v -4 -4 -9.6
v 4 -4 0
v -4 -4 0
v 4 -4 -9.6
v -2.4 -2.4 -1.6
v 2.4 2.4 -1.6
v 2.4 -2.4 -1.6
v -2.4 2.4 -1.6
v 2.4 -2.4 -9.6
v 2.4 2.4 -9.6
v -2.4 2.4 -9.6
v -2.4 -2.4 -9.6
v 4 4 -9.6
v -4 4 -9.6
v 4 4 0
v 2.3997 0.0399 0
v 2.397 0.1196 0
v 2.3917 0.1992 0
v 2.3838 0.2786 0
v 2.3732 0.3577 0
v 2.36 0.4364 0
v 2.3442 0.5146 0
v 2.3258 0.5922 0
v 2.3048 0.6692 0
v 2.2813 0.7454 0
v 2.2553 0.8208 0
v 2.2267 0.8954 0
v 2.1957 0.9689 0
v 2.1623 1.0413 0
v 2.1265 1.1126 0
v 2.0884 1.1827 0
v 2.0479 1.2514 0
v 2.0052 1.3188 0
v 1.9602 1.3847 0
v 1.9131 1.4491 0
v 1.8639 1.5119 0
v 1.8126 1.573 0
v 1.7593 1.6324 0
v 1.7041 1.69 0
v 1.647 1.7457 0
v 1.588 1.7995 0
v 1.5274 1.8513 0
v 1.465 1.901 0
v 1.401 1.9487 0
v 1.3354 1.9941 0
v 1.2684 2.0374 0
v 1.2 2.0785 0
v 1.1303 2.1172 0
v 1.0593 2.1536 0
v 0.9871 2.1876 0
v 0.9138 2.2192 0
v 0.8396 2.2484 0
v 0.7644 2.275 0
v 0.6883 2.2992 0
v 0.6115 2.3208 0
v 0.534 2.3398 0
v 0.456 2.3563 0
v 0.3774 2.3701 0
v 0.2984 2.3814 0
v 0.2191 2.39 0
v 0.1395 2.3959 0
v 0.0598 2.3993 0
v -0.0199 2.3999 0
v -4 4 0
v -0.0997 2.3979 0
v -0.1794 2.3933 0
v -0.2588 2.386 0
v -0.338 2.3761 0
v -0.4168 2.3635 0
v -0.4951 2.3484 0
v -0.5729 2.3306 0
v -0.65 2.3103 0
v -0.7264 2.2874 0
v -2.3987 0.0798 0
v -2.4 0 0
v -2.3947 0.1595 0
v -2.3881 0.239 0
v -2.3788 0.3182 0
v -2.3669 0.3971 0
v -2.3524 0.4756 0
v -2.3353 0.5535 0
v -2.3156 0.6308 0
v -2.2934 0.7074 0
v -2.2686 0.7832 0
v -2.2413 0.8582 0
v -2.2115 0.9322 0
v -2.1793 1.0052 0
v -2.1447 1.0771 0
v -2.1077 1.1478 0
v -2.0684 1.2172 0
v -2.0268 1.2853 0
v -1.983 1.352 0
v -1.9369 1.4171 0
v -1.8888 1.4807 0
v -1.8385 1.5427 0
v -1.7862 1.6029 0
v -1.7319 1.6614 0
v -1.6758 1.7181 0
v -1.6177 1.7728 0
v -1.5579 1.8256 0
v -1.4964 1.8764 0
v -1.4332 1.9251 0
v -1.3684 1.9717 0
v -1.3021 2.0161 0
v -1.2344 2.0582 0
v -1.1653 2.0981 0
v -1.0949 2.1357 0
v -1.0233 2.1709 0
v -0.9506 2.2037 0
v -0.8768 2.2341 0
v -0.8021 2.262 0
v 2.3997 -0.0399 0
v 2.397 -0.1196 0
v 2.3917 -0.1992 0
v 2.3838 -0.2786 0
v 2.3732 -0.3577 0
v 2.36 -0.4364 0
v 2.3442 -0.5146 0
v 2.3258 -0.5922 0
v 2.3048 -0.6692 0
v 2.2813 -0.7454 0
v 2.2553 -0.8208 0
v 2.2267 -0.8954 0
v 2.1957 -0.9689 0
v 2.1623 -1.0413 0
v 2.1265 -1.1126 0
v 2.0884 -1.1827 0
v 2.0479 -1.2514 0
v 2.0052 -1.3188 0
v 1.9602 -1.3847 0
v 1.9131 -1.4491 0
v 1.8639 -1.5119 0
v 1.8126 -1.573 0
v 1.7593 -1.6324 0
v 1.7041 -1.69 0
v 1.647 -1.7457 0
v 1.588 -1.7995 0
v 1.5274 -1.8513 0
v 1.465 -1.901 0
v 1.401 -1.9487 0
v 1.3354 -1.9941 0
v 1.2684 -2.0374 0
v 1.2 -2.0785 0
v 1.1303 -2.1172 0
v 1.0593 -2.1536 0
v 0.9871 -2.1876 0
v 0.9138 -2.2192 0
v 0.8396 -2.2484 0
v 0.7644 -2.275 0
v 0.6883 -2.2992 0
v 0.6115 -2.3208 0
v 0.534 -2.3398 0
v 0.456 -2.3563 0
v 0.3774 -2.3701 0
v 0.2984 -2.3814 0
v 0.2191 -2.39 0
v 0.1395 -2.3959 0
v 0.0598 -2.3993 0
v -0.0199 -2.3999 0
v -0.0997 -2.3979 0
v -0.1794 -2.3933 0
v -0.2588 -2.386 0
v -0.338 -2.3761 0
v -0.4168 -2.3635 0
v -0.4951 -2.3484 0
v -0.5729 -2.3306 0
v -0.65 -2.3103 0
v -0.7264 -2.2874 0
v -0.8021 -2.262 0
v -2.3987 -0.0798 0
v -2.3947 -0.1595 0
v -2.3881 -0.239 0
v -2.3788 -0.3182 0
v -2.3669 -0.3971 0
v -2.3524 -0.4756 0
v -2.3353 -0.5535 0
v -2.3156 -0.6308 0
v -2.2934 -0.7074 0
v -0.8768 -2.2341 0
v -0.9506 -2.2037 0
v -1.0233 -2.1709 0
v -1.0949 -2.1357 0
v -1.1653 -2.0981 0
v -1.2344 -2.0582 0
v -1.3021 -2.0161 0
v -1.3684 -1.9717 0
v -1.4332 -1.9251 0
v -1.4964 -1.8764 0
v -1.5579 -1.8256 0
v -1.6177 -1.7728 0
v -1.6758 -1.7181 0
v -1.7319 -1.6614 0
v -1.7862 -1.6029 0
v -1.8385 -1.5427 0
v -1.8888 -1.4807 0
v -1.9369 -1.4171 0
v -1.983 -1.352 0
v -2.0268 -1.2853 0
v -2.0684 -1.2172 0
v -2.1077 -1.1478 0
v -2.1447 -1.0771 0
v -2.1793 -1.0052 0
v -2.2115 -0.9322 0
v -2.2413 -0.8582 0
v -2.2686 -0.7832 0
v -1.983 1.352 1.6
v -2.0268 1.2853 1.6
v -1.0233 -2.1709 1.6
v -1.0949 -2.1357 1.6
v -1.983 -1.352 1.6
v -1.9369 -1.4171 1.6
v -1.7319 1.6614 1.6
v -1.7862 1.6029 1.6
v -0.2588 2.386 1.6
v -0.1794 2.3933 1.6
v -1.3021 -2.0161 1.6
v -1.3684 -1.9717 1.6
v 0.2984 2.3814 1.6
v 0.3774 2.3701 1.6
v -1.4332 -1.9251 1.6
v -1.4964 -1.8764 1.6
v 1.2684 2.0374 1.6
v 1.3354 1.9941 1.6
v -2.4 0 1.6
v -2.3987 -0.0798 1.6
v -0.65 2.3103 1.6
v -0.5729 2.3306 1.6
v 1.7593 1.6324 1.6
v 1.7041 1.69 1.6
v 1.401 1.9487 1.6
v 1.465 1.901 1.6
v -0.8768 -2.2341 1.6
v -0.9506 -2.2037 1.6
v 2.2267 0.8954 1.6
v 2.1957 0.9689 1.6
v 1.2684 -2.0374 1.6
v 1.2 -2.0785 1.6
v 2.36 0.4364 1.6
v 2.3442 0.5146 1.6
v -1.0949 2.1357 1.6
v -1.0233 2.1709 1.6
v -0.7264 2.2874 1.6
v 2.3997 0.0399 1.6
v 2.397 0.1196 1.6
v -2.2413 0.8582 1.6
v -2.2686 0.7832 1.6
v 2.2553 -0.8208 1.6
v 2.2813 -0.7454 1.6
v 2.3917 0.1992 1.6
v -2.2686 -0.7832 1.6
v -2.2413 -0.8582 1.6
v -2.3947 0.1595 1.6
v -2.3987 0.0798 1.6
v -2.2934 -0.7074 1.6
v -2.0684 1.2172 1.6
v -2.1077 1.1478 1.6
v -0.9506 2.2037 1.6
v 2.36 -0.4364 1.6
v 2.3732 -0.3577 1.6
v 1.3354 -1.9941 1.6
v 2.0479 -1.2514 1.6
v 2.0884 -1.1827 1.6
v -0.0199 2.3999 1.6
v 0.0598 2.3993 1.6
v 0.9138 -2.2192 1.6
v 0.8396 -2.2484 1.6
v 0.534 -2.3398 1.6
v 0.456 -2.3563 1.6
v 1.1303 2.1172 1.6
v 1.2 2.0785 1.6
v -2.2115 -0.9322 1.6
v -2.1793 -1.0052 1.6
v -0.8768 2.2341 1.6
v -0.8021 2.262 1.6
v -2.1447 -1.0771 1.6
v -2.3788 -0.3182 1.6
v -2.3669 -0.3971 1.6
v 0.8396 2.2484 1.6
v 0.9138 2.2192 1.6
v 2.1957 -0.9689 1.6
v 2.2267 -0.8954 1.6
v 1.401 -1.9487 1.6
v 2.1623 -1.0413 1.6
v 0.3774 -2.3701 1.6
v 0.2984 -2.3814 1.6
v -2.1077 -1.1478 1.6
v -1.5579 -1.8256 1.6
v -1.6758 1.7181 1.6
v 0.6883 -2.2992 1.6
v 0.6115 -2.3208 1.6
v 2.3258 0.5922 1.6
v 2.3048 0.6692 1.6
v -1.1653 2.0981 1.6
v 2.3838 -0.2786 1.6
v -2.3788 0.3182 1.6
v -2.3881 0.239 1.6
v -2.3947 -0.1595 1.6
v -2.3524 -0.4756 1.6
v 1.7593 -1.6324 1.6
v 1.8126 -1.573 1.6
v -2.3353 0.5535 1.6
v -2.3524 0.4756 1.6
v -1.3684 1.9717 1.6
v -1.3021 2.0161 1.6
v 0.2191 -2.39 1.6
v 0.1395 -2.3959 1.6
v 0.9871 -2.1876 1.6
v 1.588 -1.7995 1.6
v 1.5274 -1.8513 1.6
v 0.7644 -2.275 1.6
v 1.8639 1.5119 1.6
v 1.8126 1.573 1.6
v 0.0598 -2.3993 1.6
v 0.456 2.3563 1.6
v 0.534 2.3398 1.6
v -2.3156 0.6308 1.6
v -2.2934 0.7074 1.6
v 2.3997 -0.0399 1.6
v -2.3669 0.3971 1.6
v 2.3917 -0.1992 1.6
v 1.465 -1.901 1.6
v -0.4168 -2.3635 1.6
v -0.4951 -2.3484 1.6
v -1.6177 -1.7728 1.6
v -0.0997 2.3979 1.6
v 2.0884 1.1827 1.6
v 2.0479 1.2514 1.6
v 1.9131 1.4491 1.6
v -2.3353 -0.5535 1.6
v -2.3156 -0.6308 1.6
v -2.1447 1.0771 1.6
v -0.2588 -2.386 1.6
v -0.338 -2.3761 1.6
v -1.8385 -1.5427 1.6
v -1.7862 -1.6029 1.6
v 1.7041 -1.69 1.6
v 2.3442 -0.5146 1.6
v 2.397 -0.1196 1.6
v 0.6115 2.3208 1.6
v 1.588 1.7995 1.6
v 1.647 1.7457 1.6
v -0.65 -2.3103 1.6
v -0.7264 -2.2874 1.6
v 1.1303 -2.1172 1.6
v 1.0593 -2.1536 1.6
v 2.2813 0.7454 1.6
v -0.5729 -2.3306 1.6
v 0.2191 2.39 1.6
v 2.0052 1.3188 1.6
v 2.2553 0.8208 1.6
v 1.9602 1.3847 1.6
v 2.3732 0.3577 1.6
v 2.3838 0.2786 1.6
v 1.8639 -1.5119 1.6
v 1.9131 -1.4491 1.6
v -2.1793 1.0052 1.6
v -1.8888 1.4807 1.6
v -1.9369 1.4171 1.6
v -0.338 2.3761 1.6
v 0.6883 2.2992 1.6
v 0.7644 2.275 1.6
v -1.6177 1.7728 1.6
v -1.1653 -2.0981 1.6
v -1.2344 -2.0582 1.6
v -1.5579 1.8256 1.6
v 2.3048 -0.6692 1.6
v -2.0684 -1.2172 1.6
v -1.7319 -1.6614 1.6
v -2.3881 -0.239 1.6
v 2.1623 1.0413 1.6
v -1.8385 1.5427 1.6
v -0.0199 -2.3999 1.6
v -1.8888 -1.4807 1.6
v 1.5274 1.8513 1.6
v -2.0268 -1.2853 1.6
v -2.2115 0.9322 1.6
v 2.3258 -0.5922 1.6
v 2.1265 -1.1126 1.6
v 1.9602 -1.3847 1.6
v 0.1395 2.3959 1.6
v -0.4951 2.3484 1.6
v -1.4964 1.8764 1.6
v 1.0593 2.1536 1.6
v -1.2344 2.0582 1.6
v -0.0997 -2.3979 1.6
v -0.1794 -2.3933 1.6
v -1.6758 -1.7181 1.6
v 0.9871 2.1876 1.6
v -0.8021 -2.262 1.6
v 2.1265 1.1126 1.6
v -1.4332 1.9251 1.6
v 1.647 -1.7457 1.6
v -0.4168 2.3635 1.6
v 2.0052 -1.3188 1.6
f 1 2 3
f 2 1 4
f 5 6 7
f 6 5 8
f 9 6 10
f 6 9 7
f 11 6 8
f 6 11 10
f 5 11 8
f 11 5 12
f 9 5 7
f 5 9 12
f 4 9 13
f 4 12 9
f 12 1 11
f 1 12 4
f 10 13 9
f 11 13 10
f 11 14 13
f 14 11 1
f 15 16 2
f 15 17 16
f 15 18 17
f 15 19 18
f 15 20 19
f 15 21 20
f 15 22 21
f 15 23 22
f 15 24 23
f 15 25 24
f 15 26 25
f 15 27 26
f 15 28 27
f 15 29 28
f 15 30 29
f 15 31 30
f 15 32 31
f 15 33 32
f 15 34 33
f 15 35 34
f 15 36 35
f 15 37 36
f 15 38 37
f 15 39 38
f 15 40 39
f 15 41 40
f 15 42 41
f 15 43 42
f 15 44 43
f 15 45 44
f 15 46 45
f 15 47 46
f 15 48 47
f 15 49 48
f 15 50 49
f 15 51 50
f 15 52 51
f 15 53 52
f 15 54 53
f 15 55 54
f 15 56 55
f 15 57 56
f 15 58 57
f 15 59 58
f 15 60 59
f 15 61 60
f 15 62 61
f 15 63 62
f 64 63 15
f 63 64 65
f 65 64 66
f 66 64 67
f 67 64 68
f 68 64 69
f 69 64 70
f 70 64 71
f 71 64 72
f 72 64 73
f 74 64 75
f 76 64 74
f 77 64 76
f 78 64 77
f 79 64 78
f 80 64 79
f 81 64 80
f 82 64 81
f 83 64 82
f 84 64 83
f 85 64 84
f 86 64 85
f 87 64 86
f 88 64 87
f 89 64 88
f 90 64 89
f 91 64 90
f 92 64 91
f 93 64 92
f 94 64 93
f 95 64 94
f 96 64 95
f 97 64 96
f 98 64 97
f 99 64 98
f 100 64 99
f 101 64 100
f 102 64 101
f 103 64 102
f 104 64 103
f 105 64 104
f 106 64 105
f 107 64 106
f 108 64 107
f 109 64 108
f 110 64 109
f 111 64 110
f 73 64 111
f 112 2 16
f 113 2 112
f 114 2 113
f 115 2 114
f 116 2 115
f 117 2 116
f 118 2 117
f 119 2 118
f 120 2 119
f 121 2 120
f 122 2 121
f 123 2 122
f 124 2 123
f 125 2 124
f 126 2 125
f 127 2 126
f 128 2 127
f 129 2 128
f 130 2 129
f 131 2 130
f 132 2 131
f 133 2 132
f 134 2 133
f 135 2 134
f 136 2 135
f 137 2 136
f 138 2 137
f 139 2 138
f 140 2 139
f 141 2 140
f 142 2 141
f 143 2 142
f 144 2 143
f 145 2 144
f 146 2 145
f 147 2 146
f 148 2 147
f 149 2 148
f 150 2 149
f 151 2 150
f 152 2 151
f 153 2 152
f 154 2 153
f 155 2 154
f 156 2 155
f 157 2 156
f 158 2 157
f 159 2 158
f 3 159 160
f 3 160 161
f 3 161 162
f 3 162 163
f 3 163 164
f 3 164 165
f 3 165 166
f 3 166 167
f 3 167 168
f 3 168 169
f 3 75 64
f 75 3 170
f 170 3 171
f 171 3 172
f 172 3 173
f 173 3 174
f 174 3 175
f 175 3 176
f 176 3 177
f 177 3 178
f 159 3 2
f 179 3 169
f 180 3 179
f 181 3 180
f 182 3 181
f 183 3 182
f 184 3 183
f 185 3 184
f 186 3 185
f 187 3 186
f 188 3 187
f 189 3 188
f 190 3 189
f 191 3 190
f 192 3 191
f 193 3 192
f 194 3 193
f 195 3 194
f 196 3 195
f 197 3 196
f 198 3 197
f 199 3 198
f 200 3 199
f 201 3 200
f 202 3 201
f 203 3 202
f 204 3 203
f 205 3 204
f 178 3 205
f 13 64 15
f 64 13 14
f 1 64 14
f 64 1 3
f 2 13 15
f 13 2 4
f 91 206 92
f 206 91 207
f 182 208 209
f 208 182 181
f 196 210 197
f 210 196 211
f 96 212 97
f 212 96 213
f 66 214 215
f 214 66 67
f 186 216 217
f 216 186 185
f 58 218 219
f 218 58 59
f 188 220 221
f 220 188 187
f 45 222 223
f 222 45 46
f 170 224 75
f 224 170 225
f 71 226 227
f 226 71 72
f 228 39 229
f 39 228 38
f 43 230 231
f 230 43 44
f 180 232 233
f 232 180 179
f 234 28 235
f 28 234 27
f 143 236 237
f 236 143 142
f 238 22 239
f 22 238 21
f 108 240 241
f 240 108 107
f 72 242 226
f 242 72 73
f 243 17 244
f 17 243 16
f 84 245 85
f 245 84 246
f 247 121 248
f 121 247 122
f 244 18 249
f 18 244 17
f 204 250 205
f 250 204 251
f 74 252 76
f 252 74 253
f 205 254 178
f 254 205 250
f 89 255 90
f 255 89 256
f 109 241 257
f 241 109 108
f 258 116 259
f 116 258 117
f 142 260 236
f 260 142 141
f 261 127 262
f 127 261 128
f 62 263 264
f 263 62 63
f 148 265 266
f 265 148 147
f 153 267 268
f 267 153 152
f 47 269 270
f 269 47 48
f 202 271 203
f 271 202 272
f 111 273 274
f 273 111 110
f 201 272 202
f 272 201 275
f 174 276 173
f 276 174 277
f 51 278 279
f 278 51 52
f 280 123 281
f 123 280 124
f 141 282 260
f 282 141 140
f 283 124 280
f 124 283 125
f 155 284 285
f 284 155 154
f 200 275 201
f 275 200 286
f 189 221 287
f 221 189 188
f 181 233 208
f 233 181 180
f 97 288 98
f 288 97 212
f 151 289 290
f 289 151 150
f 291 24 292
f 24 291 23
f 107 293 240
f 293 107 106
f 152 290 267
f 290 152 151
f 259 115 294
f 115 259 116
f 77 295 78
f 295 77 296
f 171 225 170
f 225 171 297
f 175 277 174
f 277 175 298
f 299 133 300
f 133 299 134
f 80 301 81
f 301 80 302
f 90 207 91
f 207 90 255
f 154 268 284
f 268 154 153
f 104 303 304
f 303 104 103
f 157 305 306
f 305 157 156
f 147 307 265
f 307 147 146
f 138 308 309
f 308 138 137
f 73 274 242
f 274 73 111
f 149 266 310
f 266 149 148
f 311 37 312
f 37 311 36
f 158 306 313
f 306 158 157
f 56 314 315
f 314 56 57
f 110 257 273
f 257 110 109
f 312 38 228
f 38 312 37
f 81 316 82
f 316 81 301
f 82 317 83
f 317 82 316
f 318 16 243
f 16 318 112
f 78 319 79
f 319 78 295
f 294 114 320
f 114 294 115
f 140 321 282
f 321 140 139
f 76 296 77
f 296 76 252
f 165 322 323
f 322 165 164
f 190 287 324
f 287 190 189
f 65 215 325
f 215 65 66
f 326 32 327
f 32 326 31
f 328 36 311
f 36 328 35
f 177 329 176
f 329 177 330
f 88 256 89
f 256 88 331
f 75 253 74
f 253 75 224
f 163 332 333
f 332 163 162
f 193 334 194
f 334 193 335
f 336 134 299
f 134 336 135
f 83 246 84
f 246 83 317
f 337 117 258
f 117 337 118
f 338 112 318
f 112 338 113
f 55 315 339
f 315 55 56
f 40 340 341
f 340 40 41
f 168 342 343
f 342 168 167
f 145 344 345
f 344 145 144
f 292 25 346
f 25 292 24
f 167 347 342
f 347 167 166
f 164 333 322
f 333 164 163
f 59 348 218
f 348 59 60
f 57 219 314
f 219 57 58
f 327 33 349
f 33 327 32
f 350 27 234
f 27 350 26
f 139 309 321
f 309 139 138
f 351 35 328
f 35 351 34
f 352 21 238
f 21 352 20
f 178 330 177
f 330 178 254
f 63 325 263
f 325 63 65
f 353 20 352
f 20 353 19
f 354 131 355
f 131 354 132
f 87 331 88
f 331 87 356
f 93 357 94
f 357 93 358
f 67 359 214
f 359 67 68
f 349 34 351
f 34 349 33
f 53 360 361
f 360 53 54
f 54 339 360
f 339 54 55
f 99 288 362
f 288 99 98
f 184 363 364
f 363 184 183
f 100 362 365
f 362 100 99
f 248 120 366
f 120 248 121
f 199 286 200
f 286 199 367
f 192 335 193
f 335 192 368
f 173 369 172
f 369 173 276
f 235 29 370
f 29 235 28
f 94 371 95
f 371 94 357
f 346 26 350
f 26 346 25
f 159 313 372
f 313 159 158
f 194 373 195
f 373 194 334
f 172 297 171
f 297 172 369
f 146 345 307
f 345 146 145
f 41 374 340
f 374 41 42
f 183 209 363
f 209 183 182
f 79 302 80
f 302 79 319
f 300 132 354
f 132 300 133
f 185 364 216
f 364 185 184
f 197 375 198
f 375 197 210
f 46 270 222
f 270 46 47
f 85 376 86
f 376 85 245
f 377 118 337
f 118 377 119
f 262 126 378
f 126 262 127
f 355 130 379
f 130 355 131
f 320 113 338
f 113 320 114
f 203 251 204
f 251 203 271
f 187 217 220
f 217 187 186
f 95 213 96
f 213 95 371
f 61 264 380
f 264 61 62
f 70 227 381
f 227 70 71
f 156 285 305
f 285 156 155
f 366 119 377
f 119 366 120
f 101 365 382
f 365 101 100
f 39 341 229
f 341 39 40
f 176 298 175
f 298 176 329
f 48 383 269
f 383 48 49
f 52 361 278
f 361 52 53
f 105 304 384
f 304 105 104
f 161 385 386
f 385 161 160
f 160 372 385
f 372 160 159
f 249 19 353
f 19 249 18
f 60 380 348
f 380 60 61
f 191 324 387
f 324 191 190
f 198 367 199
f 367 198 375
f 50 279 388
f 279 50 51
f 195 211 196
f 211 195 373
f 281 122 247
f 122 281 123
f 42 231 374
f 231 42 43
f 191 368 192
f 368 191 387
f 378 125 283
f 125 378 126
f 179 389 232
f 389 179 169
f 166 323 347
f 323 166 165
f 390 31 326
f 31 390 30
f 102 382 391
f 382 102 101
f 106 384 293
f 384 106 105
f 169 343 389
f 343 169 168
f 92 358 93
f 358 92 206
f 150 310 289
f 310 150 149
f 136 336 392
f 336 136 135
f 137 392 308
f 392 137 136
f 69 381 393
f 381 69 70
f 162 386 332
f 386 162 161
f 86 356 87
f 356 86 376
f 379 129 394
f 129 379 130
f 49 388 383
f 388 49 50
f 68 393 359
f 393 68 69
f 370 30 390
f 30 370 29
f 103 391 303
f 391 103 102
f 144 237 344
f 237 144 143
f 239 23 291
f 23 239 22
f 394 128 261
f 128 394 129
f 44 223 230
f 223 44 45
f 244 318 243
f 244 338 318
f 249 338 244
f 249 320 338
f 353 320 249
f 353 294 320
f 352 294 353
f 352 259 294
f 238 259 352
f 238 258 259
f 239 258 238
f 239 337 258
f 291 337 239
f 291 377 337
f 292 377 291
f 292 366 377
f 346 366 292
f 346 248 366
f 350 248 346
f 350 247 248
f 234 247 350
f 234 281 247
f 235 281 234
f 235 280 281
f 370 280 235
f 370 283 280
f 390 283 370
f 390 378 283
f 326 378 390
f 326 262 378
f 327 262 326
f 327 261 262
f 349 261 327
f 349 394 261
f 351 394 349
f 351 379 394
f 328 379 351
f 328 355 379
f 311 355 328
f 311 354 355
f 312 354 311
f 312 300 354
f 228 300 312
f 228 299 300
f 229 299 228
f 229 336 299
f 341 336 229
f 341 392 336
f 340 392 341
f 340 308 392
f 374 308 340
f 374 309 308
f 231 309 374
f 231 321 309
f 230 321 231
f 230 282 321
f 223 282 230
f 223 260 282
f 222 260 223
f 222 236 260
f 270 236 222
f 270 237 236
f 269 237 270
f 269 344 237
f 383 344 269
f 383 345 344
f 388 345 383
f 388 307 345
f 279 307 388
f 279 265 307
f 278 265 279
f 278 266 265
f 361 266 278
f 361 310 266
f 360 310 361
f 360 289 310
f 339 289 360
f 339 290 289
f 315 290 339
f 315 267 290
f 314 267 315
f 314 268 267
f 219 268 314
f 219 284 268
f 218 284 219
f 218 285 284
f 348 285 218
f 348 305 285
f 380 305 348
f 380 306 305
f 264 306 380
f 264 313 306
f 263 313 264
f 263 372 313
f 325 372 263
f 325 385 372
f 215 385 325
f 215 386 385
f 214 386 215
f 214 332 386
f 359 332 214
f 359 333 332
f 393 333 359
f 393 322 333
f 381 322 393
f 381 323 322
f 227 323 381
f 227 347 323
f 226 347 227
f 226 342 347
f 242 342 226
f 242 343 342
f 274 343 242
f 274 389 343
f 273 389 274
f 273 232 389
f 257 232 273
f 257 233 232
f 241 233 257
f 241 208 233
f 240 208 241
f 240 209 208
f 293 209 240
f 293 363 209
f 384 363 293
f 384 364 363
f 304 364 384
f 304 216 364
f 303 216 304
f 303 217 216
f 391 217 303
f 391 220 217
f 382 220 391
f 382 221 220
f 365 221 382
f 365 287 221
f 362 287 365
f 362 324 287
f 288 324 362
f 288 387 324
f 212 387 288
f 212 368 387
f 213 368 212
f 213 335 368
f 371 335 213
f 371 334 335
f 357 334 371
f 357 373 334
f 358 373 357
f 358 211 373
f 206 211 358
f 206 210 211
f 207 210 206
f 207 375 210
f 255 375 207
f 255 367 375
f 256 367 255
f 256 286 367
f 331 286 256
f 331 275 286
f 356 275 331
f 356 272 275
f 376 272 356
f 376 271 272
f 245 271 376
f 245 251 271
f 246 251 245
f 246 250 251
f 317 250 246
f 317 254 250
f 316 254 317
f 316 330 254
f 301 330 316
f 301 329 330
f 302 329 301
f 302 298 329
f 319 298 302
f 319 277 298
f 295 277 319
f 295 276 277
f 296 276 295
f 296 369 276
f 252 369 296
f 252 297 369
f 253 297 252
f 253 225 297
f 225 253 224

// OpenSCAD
// file: ../p/stud3.scad
use <../lib.scad>
use <4-4cyli.scad>
use <4-4disc.scad>
use <4-4edge.scad>
$fa=1; $fs=0.2;
function ldraw_lib__stud3(realsolid=false) = realsolid ? 
    [openscad(translate([0,0,-eps()], o=cylinder(4+eps(), r=4)),2)] : [
// 0 Stud Tube Solid
// 0 Name: stud3.dat
// 0 Author: James Jessiman
// 0 !LDRAW_ORG Primitive UPDATE 2012-01
// 0 !LICENSE Licensed under CC BY 2.0 and CC BY 4.0 : see CAreadme.txt
// 
// 0 BFC CERTIFY CCW
  [0,"BFC","CERTIFY"],
  [0,"BFC","CCW"],
// 
// 0 !HISTORY 2002-04-04 [sbliss] Modified for BFC compliance
// 0 !HISTORY 2002-04-25 [PTadmin] Official Update 2002-02
// 0 !HISTORY 2007-06-24 [PTadmin] Header formatted for Contributor Agreement
// 0 !HISTORY 2008-07-01 [PTadmin] Official Update 2008-01
// 0 !HISTORY 2012-02-16 [Philo] Changed to CCW
// 0 !HISTORY 2012-03-30 [PTadmin] Official Update 2012-01
// 
// 
// 1 16 0 -4 0 4 0 0 0 1 0 0 0 4 4-4edge.dat
  [1,16,0,-4,0,4,0,0,0,1,0,0,0,4, ldraw_lib__4_4edge(realsolid)],
// 1 16 0 0 0 4 0 0 0 1 0 0 0 4 4-4edge.dat
  [1,16,0,0,0,4,0,0,0,1,0,0,0,4, ldraw_lib__4_4edge(realsolid)],
// 1 16 0 -4 0 4 0 0 0 1 0 0 0 4 4-4disc.dat
  [1,16,0,-4,0,4,0,0,0,1,0,0,0,4, ldraw_lib__4_4disc(realsolid)],
// 1 16 0 -4 0 4 0 0 0 4 0 0 0 4 4-4cyli.dat
  [1,16,0,-4,0,4,0,0,0,4,0,0,0,4, ldraw_lib__4_4cyli(realsolid)],
];
module ldraw_lib__stud3(step=0, col=false, unit=2/5, alt=false, line=0.2, solid=!$preview)
    makepoly(ldraw_lib__stud3(solid), step=step, col=col, unit=unit, alt=alt, line=line, solid=solid);
ldraw_lib__stud3(line=0.2);
// file: ../p/4-4edge.scad
use <../lib.scad>
$fa=1; $fs=0.2;
function ldraw_lib__4_4edge(realsolid=false) = [
// 0 Circle 1.0
// 0 Name: 4-4edge.dat
// 0 Author: James Jessiman
// 0 !LDRAW_ORG Primitive UPDATE 2017-01
// 0 !LICENSE Licensed under CC BY 2.0 and CC BY 4.0 : see CAreadme.txt
// 
// 0 BFC CERTIFY CCW
  [0,"BFC","CERTIFY"],
  [0,"BFC","CCW"],
// 
// 0 !HISTORY 1998-12-15 [PTadmin] Official Update 1998-10
// 0 !HISTORY 2005-12-28 [PTadmin] Official Update 2005-01
// 0 !HISTORY 2007-06-24 [PTadmin] Header formatted for Contributor Agreement
// 0 !HISTORY 2008-07-01 [PTadmin] Official Update 2008-01
// 0 !HISTORY 2017-01-15 [Steffen] BFCed
// 0 !HISTORY 2017-12-30 [PTadmin] Official Update 2017-01
// 
// 
// 2 24 1 0 0 0.9239 0 0.3827
  [2,24,1,0,0,0.9239,0,0.3827],
// 2 24 0.9239 0 0.3827 0.7071 0 0.7071
  [2,24,0.9239,0,0.3827,0.7071,0,0.7071],
// 2 24 0.7071 0 0.7071 0.3827 0 0.9239
  [2,24,0.7071,0,0.7071,0.3827,0,0.9239],
// 2 24 0.3827 0 0.9239 0 0 1
  [2,24,0.3827,0,0.9239,0,0,1],
// 2 24 0 0 1 -0.3827 0 0.9239
  [2,24,0,0,1,-0.3827,0,0.9239],
// 2 24 -0.3827 0 0.9239 -0.7071 0 0.7071
  [2,24,-0.3827,0,0.9239,-0.7071,0,0.7071],
// 2 24 -0.7071 0 0.7071 -0.9239 0 0.3827
  [2,24,-0.7071,0,0.7071,-0.9239,0,0.3827],
// 2 24 -0.9239 0 0.3827 -1 0 -0
  [2,24,-0.9239,0,0.3827,-1,0,-0],
// 2 24 -1 0 -0 -0.9239 0 -0.3827
  [2,24,-1,0,-0,-0.9239,0,-0.3827],
// 2 24 -0.9239 0 -0.3827 -0.7071 0 -0.7071
  [2,24,-0.9239,0,-0.3827,-0.7071,0,-0.7071],
// 2 24 -0.7071 0 -0.7071 -0.3827 0 -0.9239
  [2,24,-0.7071,0,-0.7071,-0.3827,0,-0.9239],
// 2 24 -0.3827 0 -0.9239 0 0 -1
  [2,24,-0.3827,0,-0.9239,0,0,-1],
// 2 24 0 0 -1 0.3827 0 -0.9239
  [2,24,0,0,-1,0.3827,0,-0.9239],
// 2 24 0.3827 0 -0.9239 0.7071 0 -0.7071
  [2,24,0.3827,0,-0.9239,0.7071,0,-0.7071],
// 2 24 0.7071 0 -0.7071 0.9239 0 -0.3827
  [2,24,0.7071,0,-0.7071,0.9239,0,-0.3827],
// 2 24 0.9239 0 -0.3827 1 0 0
  [2,24,0.9239,0,-0.3827,1,0,0],
];
module ldraw_lib__4_4edge(step=0, col=false, unit=2/5, alt=false, line=0.2, solid=!$preview)
    makepoly(ldraw_lib__4_4edge(solid), step=step, col=col, unit=unit, alt=alt, line=line, solid=solid);
ldraw_lib__4_4edge(line=0.2);
// file: ../p/4-4disc.scad
use <../lib.scad>
$fa=1; $fs=0.2;
function ldraw_lib__4_4disc(realsolid=false) = [
// 0 Disc 1.0
// 0 Name: 4-4disc.dat
// 0 Author: James Jessiman
// 0 !LDRAW_ORG Primitive UPDATE 2002-02
// 0 !LICENSE Licensed under CC BY 2.0 and CC BY 4.0 : see CAreadme.txt
// 
// 0 BFC CERTIFY CCW
  [0,"BFC","CERTIFY"],
  [0,"BFC","CCW"],
// 
// 0 !HISTORY 1998-12-15 [PTadmin] Official Update 1998-10
// 0 !HISTORY 2002-03-23 [sbliss] Added BFC statement
// 0 !HISTORY 2002-04-25 [PTadmin] Official Update 2002-02
// 0 !HISTORY 2007-06-24 [PTadmin] Header formatted for Contributor Agreement
// 0 !HISTORY 2008-07-01 [PTadmin] Official Update 2008-01
// 
// 
// 3 16 0 0 0 1 0 0 0.9239 0 0.3827
  [3,16,0,0,0,1,0,0,0.9239,0,0.3827],
// 3 16 0 0 0 0.9239 0 0.3827 0.7071 0 0.7071
  [3,16,0,0,0,0.9239,0,0.3827,0.7071,0,0.7071],
// 3 16 0 0 0 0.7071 0 0.7071 0.3827 0 0.9239
  [3,16,0,0,0,0.7071,0,0.7071,0.3827,0,0.9239],
// 3 16 0 0 0 0.3827 0 0.9239 0 0 1
  [3,16,0,0,0,0.3827,0,0.9239,0,0,1],
// 3 16 0 0 0 0 0 1 -0.3827 0 0.9239
  [3,16,0,0,0,0,0,1,-0.3827,0,0.9239],
// 3 16 0 0 0 -0.3827 0 0.9239 -0.7071 0 0.7071
  [3,16,0,0,0,-0.3827,0,0.9239,-0.7071,0,0.7071],
// 3 16 0 0 0 -0.7071 0 0.7071 -0.9239 0 0.3827
  [3,16,0,0,0,-0.7071,0,0.7071,-0.9239,0,0.3827],
// 3 16 0 0 0 -0.9239 0 0.3827 -1 0 -0
  [3,16,0,0,0,-0.9239,0,0.3827,-1,0,-0],
// 3 16 0 0 0 -1 0 -0 -0.9239 0 -0.3827
  [3,16,0,0,0,-1,0,-0,-0.9239,0,-0.3827],
// 3 16 0 0 0 -0.9239 0 -0.3827 -0.7071 0 -0.7071
  [3,16,0,0,0,-0.9239,0,-0.3827,-0.7071,0,-0.7071],
// 3 16 0 0 0 -0.7071 0 -0.7071 -0.3827 0 -0.9239
  [3,16,0,0,0,-0.7071,0,-0.7071,-0.3827,0,-0.9239],
// 3 16 0 0 0 -0.3827 0 -0.9239 0 0 -1
  [3,16,0,0,0,-0.3827,0,-0.9239,0,0,-1],
// 3 16 0 0 0 0 0 -1 0.3827 0 -0.9239
  [3,16,0,0,0,0,0,-1,0.3827,0,-0.9239],
// 3 16 0 0 0 0.3827 0 -0.9239 0.7071 0 -0.7071
  [3,16,0,0,0,0.3827,0,-0.9239,0.7071,0,-0.7071],
// 3 16 0 0 0 0.7071 0 -0.7071 0.9239 0 -0.3827
  [3,16,0,0,0,0.7071,0,-0.7071,0.9239,0,-0.3827],
// 3 16 0 0 0 0.9239 0 -0.3827 1 0 0
  [3,16,0,0,0,0.9239,0,-0.3827,1,0,0],
// 0
];
module ldraw_lib__4_4disc(step=0, col=false, unit=2/5, alt=false, line=0.2, solid=!$preview)
    makepoly(ldraw_lib__4_4disc(solid), step=step, col=col, unit=unit, alt=alt, line=line, solid=solid);
ldraw_lib__4_4disc(line=0.2);
// file: ../p/4-4cyli.scad
use <../lib.scad>
$fa=1; $fs=0.2;
function ldraw_lib__4_4cyli(realsolid=false) = [
// 0 Cylinder 1.0
// 0 Name: 4-4cyli.dat
// 0 Author: James Jessiman
// 0 !LDRAW_ORG Primitive UPDATE 2005-01
// 0 !LICENSE Licensed under CC BY 2.0 and CC BY 4.0 : see CAreadme.txt
// 
// 0 BFC CERTIFY CCW
  [0,"BFC","CERTIFY"],
  [0,"BFC","CCW"],
// 
// 0 !HISTORY 1998-12-15 [PTadmin] Official Update 1998-10
// 0 !HISTORY 2002-03-23 [sbliss] Added BFC statement; merged headers from files in distributions LDraw 0.27 and Complete.
// 0 !HISTORY 2002-04-25 [PTadmin] Official Update 2002-02
// 0 !HISTORY 2004-12-14 [guyvivan] BFC CCW
// 0 !HISTORY 2005-12-28 [PTadmin] Official Update 2005-01
// 0 !HISTORY 2007-06-24 [PTadmin] Header formatted for Contributor Agreement
// 0 !HISTORY 2008-07-01 [PTadmin] Official Update 2008-01
// 
// 
// 4 16 1 1 0 0.9239 1 0.3827 0.9239 0 0.3827 1 0 0
  [4,16,1,1,0,0.9239,1,0.3827,0.9239,0,0.3827,1,0,0],
// 5 24 1 0 0 1 1 0 0.9239 0 0.3827 0.9239 0 -0.3827
  [5,24,1,0,0,1,1,0,0.9239,0,0.3827,0.9239,0,-0.3827],
// 4 16 0.9239 1 0.3827 0.7071 1 0.7071 0.7071 0 0.7071 0.9239 0 0.3827
  [4,16,0.9239,1,0.3827,0.7071,1,0.7071,0.7071,0,0.7071,0.9239,0,0.3827],
// 5 24 0.9239 0 0.3827 0.9239 1 0.3827 0.7071 0 0.7071 1 0 0
  [5,24,0.9239,0,0.3827,0.9239,1,0.3827,0.7071,0,0.7071,1,0,0],
// 4 16 0.7071 1 0.7071 0.3827 1 0.9239 0.3827 0 0.9239 0.7071 0 0.7071
  [4,16,0.7071,1,0.7071,0.3827,1,0.9239,0.3827,0,0.9239,0.7071,0,0.7071],
// 5 24 0.7071 0 0.7071 0.7071 1 0.7071 0.3827 0 0.9239 0.9239 0 0.3827
  [5,24,0.7071,0,0.7071,0.7071,1,0.7071,0.3827,0,0.9239,0.9239,0,0.3827],
// 4 16 0.3827 1 0.9239 0 1 1 0 0 1 0.3827 0 0.9239
  [4,16,0.3827,1,0.9239,0,1,1,0,0,1,0.3827,0,0.9239],
// 5 24 0.3827 0 0.9239 0.3827 1 0.9239 0 0 1 0.7071 0 0.7071
  [5,24,0.3827,0,0.9239,0.3827,1,0.9239,0,0,1,0.7071,0,0.7071],
// 4 16 0 1 1 -0.3827 1 0.9239 -0.3827 0 0.9239 0 0 1
  [4,16,0,1,1,-0.3827,1,0.9239,-0.3827,0,0.9239,0,0,1],
// 5 24 0 0 1 0 1 1 -0.3827 0 0.9239 0.3827 0 0.9239
  [5,24,0,0,1,0,1,1,-0.3827,0,0.9239,0.3827,0,0.9239],
// 4 16 -0.3827 1 0.9239 -0.7071 1 0.7071 -0.7071 0 0.7071 -0.3827 0 0.9239
  [4,16,-0.3827,1,0.9239,-0.7071,1,0.7071,-0.7071,0,0.7071,-0.3827,0,0.9239],
// 5 24 -0.3827 0 0.9239 -0.3827 1 0.9239 -0.7071 0 0.7071 0 0 1
  [5,24,-0.3827,0,0.9239,-0.3827,1,0.9239,-0.7071,0,0.7071,0,0,1],
// 4 16 -0.7071 1 0.7071 -0.9239 1 0.3827 -0.9239 0 0.3827 -0.7071 0 0.7071
  [4,16,-0.7071,1,0.7071,-0.9239,1,0.3827,-0.9239,0,0.3827,-0.7071,0,0.7071],
// 5 24 -0.7071 0 0.7071 -0.7071 1 0.7071 -0.9239 0 0.3827 -0.3827 0 0.9239
  [5,24,-0.7071,0,0.7071,-0.7071,1,0.7071,-0.9239,0,0.3827,-0.3827,0,0.9239],
// 4 16 -0.9239 1 0.3827 -1 1 0 -1 0 0 -0.9239 0 0.3827
  [4,16,-0.9239,1,0.3827,-1,1,0,-1,0,0,-0.9239,0,0.3827],
// 5 24 -0.9239 0 0.3827 -0.9239 1 0.3827 -1 0 0 -0.7071 0 0.7071
  [5,24,-0.9239,0,0.3827,-0.9239,1,0.3827,-1,0,0,-0.7071,0,0.7071],
// 4 16 -1 1 0 -0.9239 1 -0.3827 -0.9239 0 -0.3827 -1 0 0
  [4,16,-1,1,0,-0.9239,1,-0.3827,-0.9239,0,-0.3827,-1,0,0],
// 5 24 -1 0 0 -1 1 0 -0.9239 0 -0.3827 -0.9239 0 0.3827
  [5,24,-1,0,0,-1,1,0,-0.9239,0,-0.3827,-0.9239,0,0.3827],
// 4 16 -0.9239 1 -0.3827 -0.7071 1 -0.7071 -0.7071 0 -0.7071 -0.9239 0 -0.3827
  [4,16,-0.9239,1,-0.3827,-0.7071,1,-0.7071,-0.7071,0,-0.7071,-0.9239,0,-0.3827],
// 5 24 -0.9239 0 -0.3827 -0.9239 1 -0.3827 -0.7071 0 -0.7071 -1 0 0
  [5,24,-0.9239,0,-0.3827,-0.9239,1,-0.3827,-0.7071,0,-0.7071,-1,0,0],
// 4 16 -0.7071 1 -0.7071 -0.3827 1 -0.9239 -0.3827 0 -0.9239 -0.7071 0 -0.7071
  [4,16,-0.7071,1,-0.7071,-0.3827,1,-0.9239,-0.3827,0,-0.9239,-0.7071,0,-0.7071],
// 5 24 -0.7071 0 -0.7071 -0.7071 1 -0.7071 -0.3827 0 -0.9239 -0.9239 0 -0.3827
  [5,24,-0.7071,0,-0.7071,-0.7071,1,-0.7071,-0.3827,0,-0.9239,-0.9239,0,-0.3827],
// 4 16 -0.3827 1 -0.9239 0 1 -1 0 0 -1 -0.3827 0 -0.9239
  [4,16,-0.3827,1,-0.9239,0,1,-1,0,0,-1,-0.3827,0,-0.9239],
// 5 24 -0.3827 0 -0.9239 -0.3827 1 -0.9239 0 0 -1 -0.7071 0 -0.7071
  [5,24,-0.3827,0,-0.9239,-0.3827,1,-0.9239,0,0,-1,-0.7071,0,-0.7071],
// 4 16 0 1 -1 0.3827 1 -0.9239 0.3827 0 -0.9239 0 0 -1
  [4,16,0,1,-1,0.3827,1,-0.9239,0.3827,0,-0.9239,0,0,-1],
// 5 24 0 0 -1 0 1 -1 0.3827 0 -0.9239 -0.3827 0 -0.9239
  [5,24,0,0,-1,0,1,-1,0.3827,0,-0.9239,-0.3827,0,-0.9239],
// 4 16 0.3827 1 -0.9239 0.7071 1 -0.7071 0.7071 0 -0.7071 0.3827 0 -0.9239
  [4,16,0.3827,1,-0.9239,0.7071,1,-0.7071,0.7071,0,-0.7071,0.3827,0,-0.9239],
// 5 24 0.3827 0 -0.9239 0.3827 1 -0.9239 0.7071 0 -0.7071 0 0 -1
  [5,24,0.3827,0,-0.9239,0.3827,1,-0.9239,0.7071,0,-0.7071,0,0,-1],
// 4 16 0.7071 1 -0.7071 0.9239 1 -0.3827 0.9239 0 -0.3827 0.7071 0 -0.7071
  [4,16,0.7071,1,-0.7071,0.9239,1,-0.3827,0.9239,0,-0.3827,0.7071,0,-0.7071],
// 5 24 0.7071 0 -0.7071 0.7071 1 -0.7071 0.9239 0 -0.3827 0.3827 0 -0.9239
  [5,24,0.7071,0,-0.7071,0.7071,1,-0.7071,0.9239,0,-0.3827,0.3827,0,-0.9239],
// 4 16 0.9239 1 -0.3827 1 1 0 1 0 0 0.9239 0 -0.3827
  [4,16,0.9239,1,-0.3827,1,1,0,1,0,0,0.9239,0,-0.3827],
// 5 24 0.9239 0 -0.3827 0.9239 1 -0.3827 1 0 0 0.7071 0 -0.7071
  [5,24,0.9239,0,-0.3827,0.9239,1,-0.3827,1,0,0,0.7071,0,-0.7071],
// 0
];
module ldraw_lib__4_4cyli(step=0, col=false, unit=2/5, alt=false, line=0.2, solid=!$preview)
    makepoly(ldraw_lib__4_4cyli(solid), step=step, col=col, unit=unit, alt=alt, line=line, solid=solid);
ldraw_lib__4_4cyli(line=0.2);
// file: s/3004s01.scad
use <../../lib.scad>
use <../../p/box4t.scad>
use <../../p/box5.scad>
use <../../p/stud.scad>
use <../../p/stud3.scad>
$fa=1; $fs=0.2;
function ldraw_lib__s__3004s01(realsolid=false) = [
// 0 ~Brick  1 x  2 without Front Face
// 0 Name: s\3004s01.dat
// 0 Author: James Jessiman
// 0 !LDRAW_ORG Subpart UPDATE 2003-03
// 0 !LICENSE Licensed under CC BY 2.0 and CC BY 4.0 : see CAreadme.txt
// 
// 0 BFC CERTIFY CCW
  [0,"BFC","CERTIFY"],
  [0,"BFC","CCW"],
// 
// 0 !HISTORY 2003-09-07 [jriley] Subfiling, BFC
// 0 !HISTORY 2003-12-19 [PTadmin] Official Update 2003-03
// 0 !HISTORY 2007-08-29 [PTadmin] Header formatted for Contributor Agreement
// 0 !HISTORY 2008-07-01 [PTadmin] Official Update 2008-01
// 
// 
// 1 16 0 4 0 1 0 0 0 -5 0 0 0 1 stud3.dat
  [1,16,0,4,0,1,0,0,0,-5,0,0,0,1, ldraw_lib__stud3(realsolid)],
// 0 BFC INVERTNEXT
  [0,"BFC","INVERTNEXT"],
// 1 16 0 24 0 16 0 0 0 -20 0 0 0 6 box5.dat
  [1,16,0,24,0,16,0,0,0,-20,0,0,0,6, ldraw_lib__box5(realsolid)],
// 4 16 20 24 10 16 24 6 -16 24 6 -20 24 10
  [4,16,20,24,10,16,24,6,-16,24,6,-20,24,10],
// 4 16 -20 24 10 -16 24 6 -16 24 -6 -20 24 -10
  [4,16,-20,24,10,-16,24,6,-16,24,-6,-20,24,-10],
// 4 16 -20 24 -10 -16 24 -6 16 24 -6 20 24 -10
  [4,16,-20,24,-10,-16,24,-6,16,24,-6,20,24,-10],
// 4 16 20 24 -10 16 24 -6 16 24 6 20 24 10
  [4,16,20,24,-10,16,24,-6,16,24,6,20,24,10],
// 1 16 0 24 0 20 0 0 0 -24 0 0 0 10 box4t.dat
  [1,16,0,24,0,20,0,0,0,-24,0,0,0,10, ldraw_lib__box4t(realsolid)],
// 1 16 10 0 0 1 0 0 0 1 0 0 0 1 stud.dat
  [1,16,10,0,0,1,0,0,0,1,0,0,0,1, ldraw_lib__stud(realsolid)],
// 1 16 -10 0 0 1 0 0 0 1 0 0 0 1 stud.dat
  [1,16,-10,0,0,1,0,0,0,1,0,0,0,1, ldraw_lib__stud(realsolid)],
// 0
];
module ldraw_lib__s__3004s01(step=0, col=false, unit=2/5, alt=false, line=0.2, solid=!$preview)
    makepoly(ldraw_lib__s__3004s01(solid), step=step, col=col, unit=unit, alt=alt, line=line, solid=solid);
ldraw_lib__s__3004s01(line=0.2);
// file: ../p/stud.scad
use <../lib.scad>
use <4-4cyli.scad>
use <4-4disc.scad>
use <4-4edge.scad>
$fa=1; $fs=0.2;
function ldraw_lib__stud(realsolid=false) = realsolid ? 
    [openscad(translate([0,0,-eps()], o=cylinder(4+eps(), r=6)),2)] : [
// 0 Stud
// 0 Name: stud.dat
// 0 Author: James Jessiman
// 0 !LDRAW_ORG Primitive UPDATE 2012-01
// 0 !LICENSE Licensed under CC BY 2.0 and CC BY 4.0 : see CAreadme.txt
// 
// 0 BFC CERTIFY CCW
  [0,"BFC","CERTIFY"],
  [0,"BFC","CCW"],
// 
// 0 !HISTORY 2002-04-04 [sbliss] Modified for BFC compliance
// 0 !HISTORY 2002-04-25 [PTadmin] Official Update 2002-02
// 0 !HISTORY 2007-06-24 [PTadmin] Header formatted for Contributor Agreement
// 0 !HISTORY 2008-07-01 [PTadmin] Official Update 2008-01
// 0 !HISTORY 2012-02-16 [Philo] Changed to CCW
// 0 !HISTORY 2012-03-30 [PTadmin] Official Update 2012-01
// 
// 
// 1 16 0 0 0 6 0 0 0 1 0 0 0 6 4-4edge.dat
  [1,16,0,0,0,6,0,0,0,1,0,0,0,6, ldraw_lib__4_4edge(realsolid)],
// 1 16 0 -4 0 6 0 0 0 1 0 0 0 6 4-4edge.dat
  [1,16,0,-4,0,6,0,0,0,1,0,0,0,6, ldraw_lib__4_4edge(realsolid)],
// 1 16 0 0 0 6 0 0 0 -4 0 0 0 6 4-4cyli.dat
  [1,16,0,0,0,6,0,0,0,-4,0,0,0,6, ldraw_lib__4_4cyli(realsolid)],
// 1 16 0 -4 0 6 0 0 0 1 0 0 0 6 4-4disc.dat
  [1,16,0,-4,0,6,0,0,0,1,0,0,0,6, ldraw_lib__4_4disc(realsolid)],
];
module ldraw_lib__stud(step=0, col=false, unit=2/5, alt=false, line=0.2, solid=!$preview)
    makepoly(ldraw_lib__stud(solid), step=step, col=col, unit=unit, alt=alt, line=line, solid=solid);
ldraw_lib__stud(line=0.2);
// file: ../p/box5.scad
use <../lib.scad>
$fa=1; $fs=0.2;
function ldraw_lib__box5(realsolid=false) = [
// 0 Box with 5 Faces and All Edges
// 0 Name: box5.dat
// 0 Author: James Jessiman
// 0 !LDRAW_ORG Primitive UPDATE 2012-01
// 0 !LICENSE Licensed under CC BY 2.0 and CC BY 4.0 : see CAreadme.txt
// 
// 0 BFC CERTIFY CCW
  [0,"BFC","CERTIFY"],
  [0,"BFC","CCW"],
// 
// 0 !HISTORY 2002-04-03 [sbliss] Modified for BFC compliance
// 0 !HISTORY 2002-04-25 [PTadmin] Official Update 2002-02
// 0 !HISTORY 2007-06-24 [PTadmin] Header formatted for Contributor Agreement
// 0 !HISTORY 2008-07-01 [PTadmin] Official Update 2008-01
// 0 !HISTORY 2012-02-16 [Philo] Changed to CCW
// 0 !HISTORY 2012-03-30 [PTadmin] Official Update 2012-01
// 
// 
// 2 24 1 1 1 -1 1 1
  [2,24,1,1,1,-1,1,1],
// 2 24 -1 1 1 -1 1 -1
  [2,24,-1,1,1,-1,1,-1],
// 2 24 -1 1 -1 1 1 -1
  [2,24,-1,1,-1,1,1,-1],
// 2 24 1 1 -1 1 1 1
  [2,24,1,1,-1,1,1,1],
// 2 24 1 0 1 -1 0 1
  [2,24,1,0,1,-1,0,1],
// 2 24 -1 0 1 -1 0 -1
  [2,24,-1,0,1,-1,0,-1],
// 2 24 -1 0 -1 1 0 -1
  [2,24,-1,0,-1,1,0,-1],
// 2 24 1 0 -1 1 0 1
  [2,24,1,0,-1,1,0,1],
// 2 24 1 0 1 1 1 1
  [2,24,1,0,1,1,1,1],
// 2 24 -1 0 1 -1 1 1
  [2,24,-1,0,1,-1,1,1],
// 2 24 1 0 -1 1 1 -1
  [2,24,1,0,-1,1,1,-1],
// 2 24 -1 0 -1 -1 1 -1
  [2,24,-1,0,-1,-1,1,-1],
// 4 16 -1 1 1 1 1 1 1 1 -1 -1 1 -1
  [4,16,-1,1,1,1,1,1,1,1,-1,-1,1,-1],
// 4 16 -1 1 1 -1 0 1 1 0 1 1 1 1
  [4,16,-1,1,1,-1,0,1,1,0,1,1,1,1],
// 4 16 -1 1 -1 -1 0 -1 -1 0 1 -1 1 1
  [4,16,-1,1,-1,-1,0,-1,-1,0,1,-1,1,1],
// 4 16 1 1 -1 1 0 -1 -1 0 -1 -1 1 -1
  [4,16,1,1,-1,1,0,-1,-1,0,-1,-1,1,-1],
// 4 16 1 1 1 1 0 1 1 0 -1 1 1 -1
  [4,16,1,1,1,1,0,1,1,0,-1,1,1,-1],
];
module ldraw_lib__box5(step=0, col=false, unit=2/5, alt=false, line=0.2, solid=!$preview)
    makepoly(ldraw_lib__box5(solid), step=step, col=col, unit=unit, alt=alt, line=line, solid=solid);
ldraw_lib__box5(line=0.2);
// file: ../p/box4t.scad
use <../lib.scad>
$fa=1; $fs=0.2;
function ldraw_lib__box4t(realsolid=false) = [
// 0 Box with 4 Adjacent Faces and All Edges
// 0 Name: box4t.dat
// 0 Author: Tore Eriksson [Tore_Eriksson]
// 0 !LDRAW_ORG Primitive UPDATE 2003-02
// 0 !LICENSE Licensed under CC BY 2.0 and CC BY 4.0 : see CAreadme.txt
// 
// 0 BFC CERTIFY CCW
  [0,"BFC","CERTIFY"],
  [0,"BFC","CCW"],
// 
// 0 !HISTORY 1997-09-29 [PTadmin] Official Update 1997-15
// 0 !HISTORY 2002-08-31 [izanette] Modified with WINDZ for BFC compliance
// 0 !HISTORY 2003-08-01 [PTadmin] Official Update 2003-02
// 0 !HISTORY 2007-06-24 [PTadmin] Header formatted for Contributor Agreement
// 0 !HISTORY 2008-07-01 [PTadmin] Official Update 2008-01
// 
// 
// 2 24 1 1 1 -1 1 1
  [2,24,1,1,1,-1,1,1],
// 2 24 -1 1 1 -1 1 -1
  [2,24,-1,1,1,-1,1,-1],
// 2 24 -1 1 -1 1 1 -1
  [2,24,-1,1,-1,1,1,-1],
// 2 24 1 1 -1 1 1 1
  [2,24,1,1,-1,1,1,1],
// 2 24 1 0 1 -1 0 1
  [2,24,1,0,1,-1,0,1],
// 2 24 -1 0 1 -1 0 -1
  [2,24,-1,0,1,-1,0,-1],
// 2 24 -1 0 -1 1 0 -1
  [2,24,-1,0,-1,1,0,-1],
// 2 24 1 0 -1 1 0 1
  [2,24,1,0,-1,1,0,1],
// 2 24 1 0 1 1 1 1
  [2,24,1,0,1,1,1,1],
// 2 24 -1 0 1 -1 1 1
  [2,24,-1,0,1,-1,1,1],
// 2 24 1 0 -1 1 1 -1
  [2,24,1,0,-1,1,1,-1],
// 2 24 -1 0 -1 -1 1 -1
  [2,24,-1,0,-1,-1,1,-1],
// 4 16 1 1 1 1 1 -1 -1 1 -1 -1 1 1
  [4,16,1,1,1,1,1,-1,-1,1,-1,-1,1,1],
// 4 16 1 1 1 -1 1 1 -1 0 1 1 0 1
  [4,16,1,1,1,-1,1,1,-1,0,1,1,0,1],
// 4 16 -1 1 1 -1 1 -1 -1 0 -1 -1 0 1
  [4,16,-1,1,1,-1,1,-1,-1,0,-1,-1,0,1],
// 0 4 16 -1 1 -1 -1 0 -1 1 0 -1 1 1 -1
// 4 16 1 1 -1 1 1 1 1 0 1 1 0 -1
  [4,16,1,1,-1,1,1,1,1,0,1,1,0,-1],
// 0
];
module ldraw_lib__box4t(step=0, col=false, unit=2/5, alt=false, line=0.2, solid=!$preview)
    makepoly(ldraw_lib__box4t(solid), step=step, col=col, unit=unit, alt=alt, line=line, solid=solid);
ldraw_lib__box4t(line=0.2);
// file: 3004.scad
use <../lib.scad>
use <s/3004s01.scad>
$fa=1; $fs=0.2;
function ldraw_lib__3004(realsolid=false) = [
// 0 Brick  1 x  2
// 0 Name: 3004.dat
// 0 Author: James Jessiman
// 0 !LDRAW_ORG Part UPDATE 2022-05
// 0 !LICENSE Licensed under CC BY 2.0 and CC BY 4.0 : see CAreadme.txt
// 
// 0 BFC CERTIFY CCW
  [0,"BFC","CERTIFY"],
  [0,"BFC","CCW"],
// 
// 0 !HISTORY 2001-10-26 [PTadmin] Official Update 2001-01
// 0 !HISTORY 2002-05-07 {unknown} BFC Certification
// 0 !HISTORY 2002-06-11 [PTadmin] Official Update 2002-03
// 0 !HISTORY 2007-05-07 [PTadmin] Header formatted for Contributor Agreement
// 0 !HISTORY 2008-07-01 [PTadmin] Official Update 2008-01
// 0 !HISTORY 2022-08-04 [MagFors] Using subfile
// 0 !HISTORY 2022-09-15 [PTadmin] Official Update 2022-05
// 
// 
// 1 16 0 0 0 1 0 0 0 1 0 0 0 1 s\3004s01.dat
  [1,16,0,0,0,1,0,0,0,1,0,0,0,1, ldraw_lib__s__3004s01(realsolid)],
// 4 16 -20 24 -10 20 24 -10 20 0 -10 -20 0 -10
  [4,16,-20,24,-10,20,24,-10,20,0,-10,-20,0,-10],
];
module ldraw_lib__3004(step=0, col=false, unit=2/5, alt=false, line=0.2, solid=!$preview)
    makepoly(ldraw_lib__3004(solid), step=step, col=col, unit=unit, alt=alt, line=line, solid=solid);
ldraw_lib__3004(line=0.2);
// file: s/3005s01.scad
use <../../lib.scad>
use <../../p/box4t.scad>
use <../../p/box5.scad>
use <../../p/stud.scad>
$fa=1; $fs=0.2;
function ldraw_lib__s__3005s01(realsolid=false) = [
// 0 ~Brick  1 x  1 without Front Face
// 0 Name: s\3005s01.dat
// 0 Author: John Riley [jriley]
// 0 !LDRAW_ORG Subpart UPDATE 2004-01
// 0 !LICENSE Licensed under CC BY 2.0 and CC BY 4.0 : see CAreadme.txt
// 
// 0 BFC CERTIFY CCW
  [0,"BFC","CERTIFY"],
  [0,"BFC","CCW"],
// 
// 0 !HISTORY 2003-09-07 [jriley] BFCed & Subfiled
// 0 !HISTORY 2004-03-02 [PTadmin] Official Update 2004-01
// 0 !HISTORY 2007-08-29 [PTadmin] Header formatted for Contributor Agreement
// 0 !HISTORY 2008-07-01 [PTadmin] Official Update 2008-01
// 
// 
// 0 BFC INVERTNEXT
  [0,"BFC","INVERTNEXT"],
// 1 16 0 24 0 0 0 6 0 -20 0 -6 0 0 box5.dat
  [1,16,0,24,0,0,0,6,0,-20,0,-6,0,0, ldraw_lib__box5(realsolid)],
// 4 16 10 24 -10 6 24 -6 6 24 6 10 24 10
  [4,16,10,24,-10,6,24,-6,6,24,6,10,24,10],
// 4 16 10 24 10 6 24 6 -6 24 6 -10 24 10
  [4,16,10,24,10,6,24,6,-6,24,6,-10,24,10],
// 4 16 -10 24 10 -6 24 6 -6 24 -6 -10 24 -10
  [4,16,-10,24,10,-6,24,6,-6,24,-6,-10,24,-10],
// 4 16 -10 24 -10 -6 24 -6 6 24 -6 10 24 -10
  [4,16,-10,24,-10,-6,24,-6,6,24,-6,10,24,-10],
// 1 16 0 24 0 10 0 0 0 -24 0 0 0 10 box4t.dat
  [1,16,0,24,0,10,0,0,0,-24,0,0,0,10, ldraw_lib__box4t(realsolid)],
// 1 16 0 0 0 0 0 1 0 1 0 -1 0 0 stud.dat
  [1,16,0,0,0,0,0,1,0,1,0,-1,0,0, ldraw_lib__stud(realsolid)],
// 0
];
module ldraw_lib__s__3005s01(step=0, col=false, unit=2/5, alt=false, line=0.2, solid=!$preview)
    makepoly(ldraw_lib__s__3005s01(solid), step=step, col=col, unit=unit, alt=alt, line=line, solid=solid);
ldraw_lib__s__3005s01(line=0.2);
// main file
use <../lib.scad>
use <s/3005s01.scad>
$fa=1; $fs=0.2;
function ldraw_lib__3005ptm(realsolid=false) = [
// 0 Brick  1 x  1 with Blue "M" Pattern
// 0 Name: 3005ptm.dat
// 0 Author: Tore Eriksson [Tore_Eriksson]
// 0 !LDRAW_ORG Part UPDATE 2015-01
// 0 !LICENSE Licensed under CC BY 2.0 and CC BY 4.0 : see CAreadme.txt
// 
// 0 BFC CERTIFY CCW
  [0,"BFC","CERTIFY"],
  [0,"BFC","CCW"],
// 
// 0 !HISTORY 2003-12-09 [Steffen] made use of existing subfile
// 0 !HISTORY 2004-04-22 [PTadmin] Official Update 2004-02
// 0 !HISTORY 2007-05-11 [PTadmin] Header formatted for Contributor Agreement
// 0 !HISTORY 2008-07-01 [PTadmin] Official Update 2008-01
// 0 !HISTORY 2014-12-22 [Holly-Wood] Fixed T-Junction, BFCed
// 0 !HISTORY 2015-10-11 [PTadmin] Official Update 2015-01
// 
// 
// 0 // Pattern
// 4 1 -6 19 -10 -4 19 -10 -4 9.5 -10 -6 5 -10
  [4,1,-6,19,-10,-4,19,-10,-4,9.5,-10,-6,5,-10],
// 3 1 -4 5 -10 -6 5 -10 -4 9.5 -10
  [3,1,-4,5,-10,-6,5,-10,-4,9.5,-10],
// 4 1 -4 5 -10 -4 9.5 -10 -0.75 18 -10 0 14 -10
  [4,1,-4,5,-10,-4,9.5,-10,-0.75,18,-10,0,14,-10],
// 4 1 0 14 -10 -0.75 18 -10 0.75 18 -10 4 5 -10
  [4,1,0,14,-10,-0.75,18,-10,0.75,18,-10,4,5,-10],
// 3 1 4 5 -10 0.75 18 -10 4 9.5 -10
  [3,1,4,5,-10,0.75,18,-10,4,9.5,-10],
// 4 1 6 5 -10 4 5 -10 4 9.5 -10 6 19 -10
  [4,1,6,5,-10,4,5,-10,4,9.5,-10,6,19,-10],
// 3 1 4 9.5 -10 4 19 -10 6 19 -10
  [3,1,4,9.5,-10,4,19,-10,6,19,-10],
// 3 16 4 5 -10 -4 5 -10 0 14 -10
  [3,16,4,5,-10,-4,5,-10,0,14,-10],
// 3 16 -4 9.5 -10 -4 19 -10 -0.75 18 -10
  [3,16,-4,9.5,-10,-4,19,-10,-0.75,18,-10],
// 3 16 4 9.5 -10 0.75 18 -10 4 19 -10
  [3,16,4,9.5,-10,0.75,18,-10,4,19,-10],
// 4 16 0.75 18 -10 -0.75 18 -10 -4 19 -10 4 19 -10
  [4,16,0.75,18,-10,-0.75,18,-10,-4,19,-10,4,19,-10],
// 4 16 -10 24 -10 -6 19 -10 -6 5 -10 -10 0 -10
  [4,16,-10,24,-10,-6,19,-10,-6,5,-10,-10,0,-10],
// 3 16 -10 0 -10 -6 5 -10 -4 5 -10
  [3,16,-10,0,-10,-6,5,-10,-4,5,-10],
// 4 16 -10 0 -10 -4 5 -10 4 5 -10 10 0 -10
  [4,16,-10,0,-10,-4,5,-10,4,5,-10,10,0,-10],
// 3 16 10 0 -10 4 5 -10 6 5 -10
  [3,16,10,0,-10,4,5,-10,6,5,-10],
// 4 16 10 0 -10 6 5 -10 6 19 -10 10 24 -10
  [4,16,10,0,-10,6,5,-10,6,19,-10,10,24,-10],
// 3 16 6 19 -10 4 19 -10 10 24 -10
  [3,16,6,19,-10,4,19,-10,10,24,-10],
// 4 16 10 24 -10 4 19 -10 -4 19 -10 -10 24 -10
  [4,16,10,24,-10,4,19,-10,-4,19,-10,-10,24,-10],
// 3 16 -4 19 -10 -6 19 -10 -10 24 -10
  [3,16,-4,19,-10,-6,19,-10,-10,24,-10],
// 
// 0 // Subfile
// 1 16 0 0 0 1 0 0 0 1 0 0 0 1 s\3005s01.dat
  [1,16,0,0,0,1,0,0,0,1,0,0,0,1, ldraw_lib__s__3005s01(realsolid)],
];
module ldraw_lib__3005ptm(step=0, col=false, unit=2/5, alt=false, line=0.2, solid=!$preview)
    makepoly(ldraw_lib__3005ptm(solid), step=step, col=col, unit=unit, alt=alt, line=line, solid=solid);
ldraw_lib__3005ptm(line=0.2);
